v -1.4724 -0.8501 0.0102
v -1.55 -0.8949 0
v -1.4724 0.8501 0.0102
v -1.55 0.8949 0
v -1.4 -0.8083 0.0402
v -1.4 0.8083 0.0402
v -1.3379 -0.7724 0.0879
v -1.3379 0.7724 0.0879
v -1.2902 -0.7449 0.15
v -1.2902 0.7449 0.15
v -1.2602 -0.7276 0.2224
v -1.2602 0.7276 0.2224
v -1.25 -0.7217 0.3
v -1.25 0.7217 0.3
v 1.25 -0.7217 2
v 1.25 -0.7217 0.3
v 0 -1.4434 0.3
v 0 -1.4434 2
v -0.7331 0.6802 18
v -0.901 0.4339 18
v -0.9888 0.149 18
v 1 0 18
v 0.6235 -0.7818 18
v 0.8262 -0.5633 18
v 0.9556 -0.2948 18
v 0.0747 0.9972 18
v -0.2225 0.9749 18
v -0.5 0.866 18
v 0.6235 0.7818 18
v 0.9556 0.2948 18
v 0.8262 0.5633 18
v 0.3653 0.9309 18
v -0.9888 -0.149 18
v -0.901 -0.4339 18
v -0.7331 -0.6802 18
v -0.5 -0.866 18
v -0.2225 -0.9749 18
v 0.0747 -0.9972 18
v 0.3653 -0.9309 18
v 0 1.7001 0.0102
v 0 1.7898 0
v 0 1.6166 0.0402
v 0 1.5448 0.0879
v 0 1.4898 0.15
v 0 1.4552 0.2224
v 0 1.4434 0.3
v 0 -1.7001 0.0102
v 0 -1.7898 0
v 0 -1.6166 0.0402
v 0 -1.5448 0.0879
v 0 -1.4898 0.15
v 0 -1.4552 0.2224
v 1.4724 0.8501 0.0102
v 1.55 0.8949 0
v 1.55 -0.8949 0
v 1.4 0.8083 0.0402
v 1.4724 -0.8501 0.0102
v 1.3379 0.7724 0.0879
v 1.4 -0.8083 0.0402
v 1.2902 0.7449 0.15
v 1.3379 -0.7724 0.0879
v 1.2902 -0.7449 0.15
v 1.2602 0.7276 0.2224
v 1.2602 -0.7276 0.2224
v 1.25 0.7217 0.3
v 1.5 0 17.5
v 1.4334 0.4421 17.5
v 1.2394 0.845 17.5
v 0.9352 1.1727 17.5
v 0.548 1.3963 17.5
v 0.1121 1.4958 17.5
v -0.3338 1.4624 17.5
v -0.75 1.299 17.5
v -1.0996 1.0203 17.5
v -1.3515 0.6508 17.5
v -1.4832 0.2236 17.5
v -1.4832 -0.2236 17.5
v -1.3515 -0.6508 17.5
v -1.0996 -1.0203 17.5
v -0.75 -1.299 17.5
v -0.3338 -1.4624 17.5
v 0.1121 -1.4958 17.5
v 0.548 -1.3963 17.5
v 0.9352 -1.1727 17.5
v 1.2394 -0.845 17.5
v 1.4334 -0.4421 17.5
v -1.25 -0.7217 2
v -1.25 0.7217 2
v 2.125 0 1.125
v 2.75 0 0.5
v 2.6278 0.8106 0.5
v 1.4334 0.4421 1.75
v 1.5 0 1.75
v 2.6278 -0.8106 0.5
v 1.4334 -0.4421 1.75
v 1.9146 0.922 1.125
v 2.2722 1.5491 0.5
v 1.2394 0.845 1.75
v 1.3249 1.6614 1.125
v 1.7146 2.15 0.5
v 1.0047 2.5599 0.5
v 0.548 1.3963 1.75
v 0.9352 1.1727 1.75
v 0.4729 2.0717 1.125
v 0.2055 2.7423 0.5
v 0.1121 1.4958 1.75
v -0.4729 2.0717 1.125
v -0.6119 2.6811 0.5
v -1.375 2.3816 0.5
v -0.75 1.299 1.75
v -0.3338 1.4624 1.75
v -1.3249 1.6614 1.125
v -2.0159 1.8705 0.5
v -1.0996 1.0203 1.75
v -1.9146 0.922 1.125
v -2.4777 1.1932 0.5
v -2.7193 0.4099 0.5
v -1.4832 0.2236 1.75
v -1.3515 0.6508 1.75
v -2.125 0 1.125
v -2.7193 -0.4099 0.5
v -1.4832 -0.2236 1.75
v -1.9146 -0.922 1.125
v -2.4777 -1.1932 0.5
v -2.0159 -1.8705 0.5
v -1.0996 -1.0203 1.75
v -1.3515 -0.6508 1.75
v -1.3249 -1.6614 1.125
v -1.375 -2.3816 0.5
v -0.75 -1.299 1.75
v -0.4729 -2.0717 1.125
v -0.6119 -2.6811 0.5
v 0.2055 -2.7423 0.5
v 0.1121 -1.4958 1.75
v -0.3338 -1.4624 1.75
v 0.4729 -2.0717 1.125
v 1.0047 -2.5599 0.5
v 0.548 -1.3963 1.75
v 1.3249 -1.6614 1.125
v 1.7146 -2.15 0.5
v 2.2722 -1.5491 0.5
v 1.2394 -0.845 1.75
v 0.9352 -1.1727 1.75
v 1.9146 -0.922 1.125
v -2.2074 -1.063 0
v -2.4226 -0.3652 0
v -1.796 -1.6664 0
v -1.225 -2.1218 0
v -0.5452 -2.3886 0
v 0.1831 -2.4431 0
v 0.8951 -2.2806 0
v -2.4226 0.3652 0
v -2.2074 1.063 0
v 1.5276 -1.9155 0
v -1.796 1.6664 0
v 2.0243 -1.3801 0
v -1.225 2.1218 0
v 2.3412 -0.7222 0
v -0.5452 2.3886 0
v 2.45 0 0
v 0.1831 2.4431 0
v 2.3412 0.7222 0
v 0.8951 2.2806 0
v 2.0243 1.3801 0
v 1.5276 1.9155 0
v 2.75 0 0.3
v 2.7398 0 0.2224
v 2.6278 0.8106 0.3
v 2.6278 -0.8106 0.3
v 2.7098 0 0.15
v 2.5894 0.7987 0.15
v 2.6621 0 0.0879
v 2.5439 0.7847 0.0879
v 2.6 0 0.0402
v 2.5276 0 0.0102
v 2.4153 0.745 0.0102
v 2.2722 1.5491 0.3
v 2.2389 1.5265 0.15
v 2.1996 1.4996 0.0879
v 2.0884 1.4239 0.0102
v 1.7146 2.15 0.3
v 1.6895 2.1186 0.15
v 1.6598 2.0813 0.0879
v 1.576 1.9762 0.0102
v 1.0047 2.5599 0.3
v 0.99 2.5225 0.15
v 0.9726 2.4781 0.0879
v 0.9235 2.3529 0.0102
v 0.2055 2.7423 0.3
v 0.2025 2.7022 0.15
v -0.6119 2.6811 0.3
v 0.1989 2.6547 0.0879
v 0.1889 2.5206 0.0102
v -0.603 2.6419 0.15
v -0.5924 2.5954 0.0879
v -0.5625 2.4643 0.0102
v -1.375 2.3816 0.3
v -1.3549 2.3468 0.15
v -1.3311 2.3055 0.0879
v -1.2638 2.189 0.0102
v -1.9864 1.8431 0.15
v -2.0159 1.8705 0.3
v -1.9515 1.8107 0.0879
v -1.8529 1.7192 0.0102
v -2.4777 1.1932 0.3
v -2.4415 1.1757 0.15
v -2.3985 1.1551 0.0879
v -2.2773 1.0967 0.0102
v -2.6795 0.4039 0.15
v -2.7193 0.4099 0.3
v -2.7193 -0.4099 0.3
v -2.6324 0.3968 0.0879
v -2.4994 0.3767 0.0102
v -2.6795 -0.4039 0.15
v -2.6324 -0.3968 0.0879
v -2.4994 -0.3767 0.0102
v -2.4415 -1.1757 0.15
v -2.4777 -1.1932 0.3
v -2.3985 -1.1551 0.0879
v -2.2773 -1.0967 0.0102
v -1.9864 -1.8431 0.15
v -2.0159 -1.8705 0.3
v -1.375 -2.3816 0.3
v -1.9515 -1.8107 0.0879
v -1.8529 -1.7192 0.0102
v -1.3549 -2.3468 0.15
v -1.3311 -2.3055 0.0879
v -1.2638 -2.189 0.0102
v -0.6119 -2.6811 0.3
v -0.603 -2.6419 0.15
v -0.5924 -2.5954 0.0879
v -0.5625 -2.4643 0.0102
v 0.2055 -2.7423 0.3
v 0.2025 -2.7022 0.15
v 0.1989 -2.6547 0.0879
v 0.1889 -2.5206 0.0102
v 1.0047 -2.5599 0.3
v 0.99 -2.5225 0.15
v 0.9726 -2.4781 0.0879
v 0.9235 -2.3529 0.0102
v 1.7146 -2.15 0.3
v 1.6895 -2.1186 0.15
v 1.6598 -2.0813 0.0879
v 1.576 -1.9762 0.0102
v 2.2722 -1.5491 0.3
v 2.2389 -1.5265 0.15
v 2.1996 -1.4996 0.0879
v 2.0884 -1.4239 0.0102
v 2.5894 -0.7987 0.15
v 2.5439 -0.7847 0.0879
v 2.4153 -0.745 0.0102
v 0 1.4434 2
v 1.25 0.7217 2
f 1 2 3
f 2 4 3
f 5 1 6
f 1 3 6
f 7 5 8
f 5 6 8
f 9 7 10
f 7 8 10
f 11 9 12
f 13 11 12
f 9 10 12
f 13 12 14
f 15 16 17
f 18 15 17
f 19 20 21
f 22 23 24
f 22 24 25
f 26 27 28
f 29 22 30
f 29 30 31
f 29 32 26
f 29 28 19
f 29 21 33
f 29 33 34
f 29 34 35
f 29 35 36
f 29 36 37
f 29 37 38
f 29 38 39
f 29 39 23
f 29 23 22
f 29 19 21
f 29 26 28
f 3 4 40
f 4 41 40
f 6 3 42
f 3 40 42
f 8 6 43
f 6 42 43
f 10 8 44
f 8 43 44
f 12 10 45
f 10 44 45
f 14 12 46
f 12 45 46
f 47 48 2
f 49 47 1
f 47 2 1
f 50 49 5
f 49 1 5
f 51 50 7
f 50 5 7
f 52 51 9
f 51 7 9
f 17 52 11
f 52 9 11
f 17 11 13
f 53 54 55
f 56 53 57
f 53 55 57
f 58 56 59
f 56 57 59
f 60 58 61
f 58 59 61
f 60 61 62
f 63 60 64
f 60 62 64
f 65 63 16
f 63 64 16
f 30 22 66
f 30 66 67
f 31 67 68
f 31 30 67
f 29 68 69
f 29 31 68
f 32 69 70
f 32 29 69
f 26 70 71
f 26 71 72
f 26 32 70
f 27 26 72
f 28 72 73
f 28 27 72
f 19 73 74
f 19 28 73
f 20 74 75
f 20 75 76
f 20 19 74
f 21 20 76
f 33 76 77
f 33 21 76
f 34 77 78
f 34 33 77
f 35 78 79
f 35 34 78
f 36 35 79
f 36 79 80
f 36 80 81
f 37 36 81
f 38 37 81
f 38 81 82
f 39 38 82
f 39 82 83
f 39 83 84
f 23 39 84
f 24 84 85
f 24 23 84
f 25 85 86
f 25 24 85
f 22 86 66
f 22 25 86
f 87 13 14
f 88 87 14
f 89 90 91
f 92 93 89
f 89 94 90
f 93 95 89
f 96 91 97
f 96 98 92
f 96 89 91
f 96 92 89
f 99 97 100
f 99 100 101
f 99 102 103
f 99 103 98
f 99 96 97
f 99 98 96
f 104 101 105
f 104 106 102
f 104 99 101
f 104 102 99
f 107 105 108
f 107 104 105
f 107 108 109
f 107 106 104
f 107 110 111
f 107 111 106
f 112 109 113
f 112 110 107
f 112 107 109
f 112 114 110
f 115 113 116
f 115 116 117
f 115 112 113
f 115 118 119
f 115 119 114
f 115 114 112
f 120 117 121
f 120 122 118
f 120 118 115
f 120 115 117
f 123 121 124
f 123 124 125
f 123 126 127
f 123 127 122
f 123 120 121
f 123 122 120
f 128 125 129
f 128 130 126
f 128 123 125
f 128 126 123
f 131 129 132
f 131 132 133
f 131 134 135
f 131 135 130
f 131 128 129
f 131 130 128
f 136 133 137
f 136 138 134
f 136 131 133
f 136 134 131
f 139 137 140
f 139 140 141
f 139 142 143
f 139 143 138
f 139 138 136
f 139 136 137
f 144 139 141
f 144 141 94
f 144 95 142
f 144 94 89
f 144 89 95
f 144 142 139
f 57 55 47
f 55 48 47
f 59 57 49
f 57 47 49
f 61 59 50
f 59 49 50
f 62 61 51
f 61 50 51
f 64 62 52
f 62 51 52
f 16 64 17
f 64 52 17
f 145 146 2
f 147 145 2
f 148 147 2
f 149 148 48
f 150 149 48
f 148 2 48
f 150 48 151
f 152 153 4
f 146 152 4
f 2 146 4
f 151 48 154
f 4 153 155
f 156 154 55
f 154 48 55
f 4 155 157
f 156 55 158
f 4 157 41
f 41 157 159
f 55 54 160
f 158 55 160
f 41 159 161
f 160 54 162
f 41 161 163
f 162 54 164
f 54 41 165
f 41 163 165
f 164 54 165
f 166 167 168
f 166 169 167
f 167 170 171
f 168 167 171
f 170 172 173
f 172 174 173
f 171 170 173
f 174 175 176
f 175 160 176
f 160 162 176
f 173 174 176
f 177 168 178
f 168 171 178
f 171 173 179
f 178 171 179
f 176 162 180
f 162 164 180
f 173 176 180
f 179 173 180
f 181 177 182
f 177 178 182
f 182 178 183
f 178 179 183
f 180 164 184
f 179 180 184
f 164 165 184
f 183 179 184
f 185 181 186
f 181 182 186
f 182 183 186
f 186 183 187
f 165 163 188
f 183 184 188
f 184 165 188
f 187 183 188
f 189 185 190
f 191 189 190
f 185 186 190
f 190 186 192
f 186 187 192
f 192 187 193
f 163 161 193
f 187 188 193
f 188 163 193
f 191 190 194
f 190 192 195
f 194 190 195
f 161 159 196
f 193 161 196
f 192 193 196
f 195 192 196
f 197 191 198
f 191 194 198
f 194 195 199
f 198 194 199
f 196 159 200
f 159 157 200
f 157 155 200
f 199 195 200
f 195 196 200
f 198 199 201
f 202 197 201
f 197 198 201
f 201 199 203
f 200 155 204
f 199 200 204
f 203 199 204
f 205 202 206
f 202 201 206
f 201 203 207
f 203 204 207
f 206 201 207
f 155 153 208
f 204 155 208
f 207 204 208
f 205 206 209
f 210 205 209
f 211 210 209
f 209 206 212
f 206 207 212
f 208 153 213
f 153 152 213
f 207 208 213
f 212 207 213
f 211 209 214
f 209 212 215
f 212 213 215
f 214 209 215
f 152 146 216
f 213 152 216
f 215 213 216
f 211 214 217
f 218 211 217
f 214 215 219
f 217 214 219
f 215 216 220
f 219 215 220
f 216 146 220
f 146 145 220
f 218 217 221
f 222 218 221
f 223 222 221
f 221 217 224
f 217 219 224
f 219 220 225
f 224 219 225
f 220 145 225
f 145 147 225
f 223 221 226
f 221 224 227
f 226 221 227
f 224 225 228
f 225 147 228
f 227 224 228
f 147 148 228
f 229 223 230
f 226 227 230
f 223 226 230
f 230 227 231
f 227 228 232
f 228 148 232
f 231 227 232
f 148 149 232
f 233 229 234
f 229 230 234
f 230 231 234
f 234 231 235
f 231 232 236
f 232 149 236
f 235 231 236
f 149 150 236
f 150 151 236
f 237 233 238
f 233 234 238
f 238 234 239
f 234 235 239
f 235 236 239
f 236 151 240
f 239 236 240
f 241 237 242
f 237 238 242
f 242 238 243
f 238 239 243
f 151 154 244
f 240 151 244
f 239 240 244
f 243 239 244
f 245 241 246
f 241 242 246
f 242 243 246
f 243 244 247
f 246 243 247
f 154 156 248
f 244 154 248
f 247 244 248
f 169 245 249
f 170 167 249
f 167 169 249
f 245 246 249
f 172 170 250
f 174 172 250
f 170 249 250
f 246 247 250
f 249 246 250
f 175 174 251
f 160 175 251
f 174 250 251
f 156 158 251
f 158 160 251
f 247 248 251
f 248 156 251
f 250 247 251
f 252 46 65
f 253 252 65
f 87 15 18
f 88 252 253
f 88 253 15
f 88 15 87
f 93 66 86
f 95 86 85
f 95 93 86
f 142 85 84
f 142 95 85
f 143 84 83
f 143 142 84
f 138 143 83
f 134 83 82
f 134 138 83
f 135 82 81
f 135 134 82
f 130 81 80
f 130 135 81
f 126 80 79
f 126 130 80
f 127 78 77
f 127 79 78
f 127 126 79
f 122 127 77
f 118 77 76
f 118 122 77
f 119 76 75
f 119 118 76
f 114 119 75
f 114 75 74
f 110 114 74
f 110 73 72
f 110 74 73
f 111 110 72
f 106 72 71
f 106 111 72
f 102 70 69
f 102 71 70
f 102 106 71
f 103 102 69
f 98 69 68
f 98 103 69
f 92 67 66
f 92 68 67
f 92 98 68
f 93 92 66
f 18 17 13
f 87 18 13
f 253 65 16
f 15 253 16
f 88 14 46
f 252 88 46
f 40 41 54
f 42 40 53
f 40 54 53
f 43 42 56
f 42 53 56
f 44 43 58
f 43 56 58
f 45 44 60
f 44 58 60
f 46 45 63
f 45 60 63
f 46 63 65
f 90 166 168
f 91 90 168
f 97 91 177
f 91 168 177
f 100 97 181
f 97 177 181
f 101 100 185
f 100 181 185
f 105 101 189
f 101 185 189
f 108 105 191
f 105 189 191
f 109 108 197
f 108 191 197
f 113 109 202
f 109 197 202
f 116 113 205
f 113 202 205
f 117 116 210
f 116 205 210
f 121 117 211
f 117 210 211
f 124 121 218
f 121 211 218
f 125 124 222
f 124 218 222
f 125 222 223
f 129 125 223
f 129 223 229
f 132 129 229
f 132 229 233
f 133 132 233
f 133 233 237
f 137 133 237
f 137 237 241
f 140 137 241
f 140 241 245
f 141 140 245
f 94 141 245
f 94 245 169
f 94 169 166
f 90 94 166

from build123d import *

# Parameters (mm, degrees)
SKETCH1_R           = 2.75
BOSS_EXTRUDE1_DEPTH = 2
SKETCH2_R           = 1.5
BOSS_EXTRUDE2_DEPTH = 16
CHAMFER1_SIZE       = 1.5
FILLET1_R           = 0.3
CHAMFER2_SIZE       = 0.5
CUT_EXTRUDE1_DEPTH  = 2
FILLET2_R           = 0.3


with BuildPart() as part:
    # Sketch1 → Boss-Extrude1 (new body)
    with BuildSketch(Plane.XY):
        Circle(SKETCH1_R)
    extrude(amount=BOSS_EXTRUDE1_DEPTH)

    # Sketch2 → Boss-Extrude2 (add)
    with BuildSketch(Plane.XY.offset(2)):
        Circle(SKETCH2_R)
    extrude(amount=BOSS_EXTRUDE2_DEPTH)

    # Chamfer1
    # the kernel refuses this chamfer: 1.5 mm, written as the material it takes off along each edge
    with BuildSketch(Plane(origin=(0, 0, 2), x_dir=(1, 0, 0), z_dir=(0, -1, 0))) as chamfer1_piece_1_section:
        Polygon((2.75, -CHAMFER1_SIZE), (2.75 - CHAMFER1_SIZE, 0), (2.75, 0), align=None)
    chamfer1_piece_1 = revolve(axis=Axis((0, 0, 2), (0, 0, 1)), mode=Mode.PRIVATE)
    chamfer1_piece_1 = chamfer1_piece_1 - Plane(origin=(0, 0, 1.122011251), x_dir=(1, 0, 0), z_dir=(0, 0, -1)) * Cylinder(1.5, 11, mode=Mode.PRIVATE)
    add(chamfer1_piece_1, mode=Mode.SUBTRACT)

    # Fillet1
    fillet1_edges = [part.edges().sort_by_distance(p)[0] for p in [
        (-2.75, 0, 0),
    ]]
    fillet(fillet1_edges, radius=FILLET1_R)

    # Chamfer2
    chamfer2_edges = [part.edges().sort_by_distance(p)[0] for p in [
        (-1.5, 0, 18),
    ]]
    chamfer(chamfer2_edges, length=CHAMFER2_SIZE)

    # Sketch3 → Cut-Extrude1 (cut)
    with BuildSketch(Plane(origin=(0, 0, 0), x_dir=(-1, 0, 0), z_dir=(0, 0, -1))):
        Polygon((0, -1.443375673), (1.25, -0.721687836), (1.25, 0.721687836), (0, 1.443375673), (-1.25, 0.721687836), (-1.25, -0.721687836), align=None)
    extrude(amount=-CUT_EXTRUDE1_DEPTH, mode=Mode.SUBTRACT)

    # Fillet2
    fillet2_edges = [part.edges().sort_by_distance(p)[0] for p in [
        (0.625, -1.082531755, 0),
        (-0.625, -1.082531755, 0),
        (-1.25, 0, 0),
        (-0.625, 1.082531755, 0),
        (0.625, 1.082531755, 0),
        (1.25, 0, 0),
    ]]
    fillet(fillet2_edges, radius=FILLET2_R)


solid = part.part
